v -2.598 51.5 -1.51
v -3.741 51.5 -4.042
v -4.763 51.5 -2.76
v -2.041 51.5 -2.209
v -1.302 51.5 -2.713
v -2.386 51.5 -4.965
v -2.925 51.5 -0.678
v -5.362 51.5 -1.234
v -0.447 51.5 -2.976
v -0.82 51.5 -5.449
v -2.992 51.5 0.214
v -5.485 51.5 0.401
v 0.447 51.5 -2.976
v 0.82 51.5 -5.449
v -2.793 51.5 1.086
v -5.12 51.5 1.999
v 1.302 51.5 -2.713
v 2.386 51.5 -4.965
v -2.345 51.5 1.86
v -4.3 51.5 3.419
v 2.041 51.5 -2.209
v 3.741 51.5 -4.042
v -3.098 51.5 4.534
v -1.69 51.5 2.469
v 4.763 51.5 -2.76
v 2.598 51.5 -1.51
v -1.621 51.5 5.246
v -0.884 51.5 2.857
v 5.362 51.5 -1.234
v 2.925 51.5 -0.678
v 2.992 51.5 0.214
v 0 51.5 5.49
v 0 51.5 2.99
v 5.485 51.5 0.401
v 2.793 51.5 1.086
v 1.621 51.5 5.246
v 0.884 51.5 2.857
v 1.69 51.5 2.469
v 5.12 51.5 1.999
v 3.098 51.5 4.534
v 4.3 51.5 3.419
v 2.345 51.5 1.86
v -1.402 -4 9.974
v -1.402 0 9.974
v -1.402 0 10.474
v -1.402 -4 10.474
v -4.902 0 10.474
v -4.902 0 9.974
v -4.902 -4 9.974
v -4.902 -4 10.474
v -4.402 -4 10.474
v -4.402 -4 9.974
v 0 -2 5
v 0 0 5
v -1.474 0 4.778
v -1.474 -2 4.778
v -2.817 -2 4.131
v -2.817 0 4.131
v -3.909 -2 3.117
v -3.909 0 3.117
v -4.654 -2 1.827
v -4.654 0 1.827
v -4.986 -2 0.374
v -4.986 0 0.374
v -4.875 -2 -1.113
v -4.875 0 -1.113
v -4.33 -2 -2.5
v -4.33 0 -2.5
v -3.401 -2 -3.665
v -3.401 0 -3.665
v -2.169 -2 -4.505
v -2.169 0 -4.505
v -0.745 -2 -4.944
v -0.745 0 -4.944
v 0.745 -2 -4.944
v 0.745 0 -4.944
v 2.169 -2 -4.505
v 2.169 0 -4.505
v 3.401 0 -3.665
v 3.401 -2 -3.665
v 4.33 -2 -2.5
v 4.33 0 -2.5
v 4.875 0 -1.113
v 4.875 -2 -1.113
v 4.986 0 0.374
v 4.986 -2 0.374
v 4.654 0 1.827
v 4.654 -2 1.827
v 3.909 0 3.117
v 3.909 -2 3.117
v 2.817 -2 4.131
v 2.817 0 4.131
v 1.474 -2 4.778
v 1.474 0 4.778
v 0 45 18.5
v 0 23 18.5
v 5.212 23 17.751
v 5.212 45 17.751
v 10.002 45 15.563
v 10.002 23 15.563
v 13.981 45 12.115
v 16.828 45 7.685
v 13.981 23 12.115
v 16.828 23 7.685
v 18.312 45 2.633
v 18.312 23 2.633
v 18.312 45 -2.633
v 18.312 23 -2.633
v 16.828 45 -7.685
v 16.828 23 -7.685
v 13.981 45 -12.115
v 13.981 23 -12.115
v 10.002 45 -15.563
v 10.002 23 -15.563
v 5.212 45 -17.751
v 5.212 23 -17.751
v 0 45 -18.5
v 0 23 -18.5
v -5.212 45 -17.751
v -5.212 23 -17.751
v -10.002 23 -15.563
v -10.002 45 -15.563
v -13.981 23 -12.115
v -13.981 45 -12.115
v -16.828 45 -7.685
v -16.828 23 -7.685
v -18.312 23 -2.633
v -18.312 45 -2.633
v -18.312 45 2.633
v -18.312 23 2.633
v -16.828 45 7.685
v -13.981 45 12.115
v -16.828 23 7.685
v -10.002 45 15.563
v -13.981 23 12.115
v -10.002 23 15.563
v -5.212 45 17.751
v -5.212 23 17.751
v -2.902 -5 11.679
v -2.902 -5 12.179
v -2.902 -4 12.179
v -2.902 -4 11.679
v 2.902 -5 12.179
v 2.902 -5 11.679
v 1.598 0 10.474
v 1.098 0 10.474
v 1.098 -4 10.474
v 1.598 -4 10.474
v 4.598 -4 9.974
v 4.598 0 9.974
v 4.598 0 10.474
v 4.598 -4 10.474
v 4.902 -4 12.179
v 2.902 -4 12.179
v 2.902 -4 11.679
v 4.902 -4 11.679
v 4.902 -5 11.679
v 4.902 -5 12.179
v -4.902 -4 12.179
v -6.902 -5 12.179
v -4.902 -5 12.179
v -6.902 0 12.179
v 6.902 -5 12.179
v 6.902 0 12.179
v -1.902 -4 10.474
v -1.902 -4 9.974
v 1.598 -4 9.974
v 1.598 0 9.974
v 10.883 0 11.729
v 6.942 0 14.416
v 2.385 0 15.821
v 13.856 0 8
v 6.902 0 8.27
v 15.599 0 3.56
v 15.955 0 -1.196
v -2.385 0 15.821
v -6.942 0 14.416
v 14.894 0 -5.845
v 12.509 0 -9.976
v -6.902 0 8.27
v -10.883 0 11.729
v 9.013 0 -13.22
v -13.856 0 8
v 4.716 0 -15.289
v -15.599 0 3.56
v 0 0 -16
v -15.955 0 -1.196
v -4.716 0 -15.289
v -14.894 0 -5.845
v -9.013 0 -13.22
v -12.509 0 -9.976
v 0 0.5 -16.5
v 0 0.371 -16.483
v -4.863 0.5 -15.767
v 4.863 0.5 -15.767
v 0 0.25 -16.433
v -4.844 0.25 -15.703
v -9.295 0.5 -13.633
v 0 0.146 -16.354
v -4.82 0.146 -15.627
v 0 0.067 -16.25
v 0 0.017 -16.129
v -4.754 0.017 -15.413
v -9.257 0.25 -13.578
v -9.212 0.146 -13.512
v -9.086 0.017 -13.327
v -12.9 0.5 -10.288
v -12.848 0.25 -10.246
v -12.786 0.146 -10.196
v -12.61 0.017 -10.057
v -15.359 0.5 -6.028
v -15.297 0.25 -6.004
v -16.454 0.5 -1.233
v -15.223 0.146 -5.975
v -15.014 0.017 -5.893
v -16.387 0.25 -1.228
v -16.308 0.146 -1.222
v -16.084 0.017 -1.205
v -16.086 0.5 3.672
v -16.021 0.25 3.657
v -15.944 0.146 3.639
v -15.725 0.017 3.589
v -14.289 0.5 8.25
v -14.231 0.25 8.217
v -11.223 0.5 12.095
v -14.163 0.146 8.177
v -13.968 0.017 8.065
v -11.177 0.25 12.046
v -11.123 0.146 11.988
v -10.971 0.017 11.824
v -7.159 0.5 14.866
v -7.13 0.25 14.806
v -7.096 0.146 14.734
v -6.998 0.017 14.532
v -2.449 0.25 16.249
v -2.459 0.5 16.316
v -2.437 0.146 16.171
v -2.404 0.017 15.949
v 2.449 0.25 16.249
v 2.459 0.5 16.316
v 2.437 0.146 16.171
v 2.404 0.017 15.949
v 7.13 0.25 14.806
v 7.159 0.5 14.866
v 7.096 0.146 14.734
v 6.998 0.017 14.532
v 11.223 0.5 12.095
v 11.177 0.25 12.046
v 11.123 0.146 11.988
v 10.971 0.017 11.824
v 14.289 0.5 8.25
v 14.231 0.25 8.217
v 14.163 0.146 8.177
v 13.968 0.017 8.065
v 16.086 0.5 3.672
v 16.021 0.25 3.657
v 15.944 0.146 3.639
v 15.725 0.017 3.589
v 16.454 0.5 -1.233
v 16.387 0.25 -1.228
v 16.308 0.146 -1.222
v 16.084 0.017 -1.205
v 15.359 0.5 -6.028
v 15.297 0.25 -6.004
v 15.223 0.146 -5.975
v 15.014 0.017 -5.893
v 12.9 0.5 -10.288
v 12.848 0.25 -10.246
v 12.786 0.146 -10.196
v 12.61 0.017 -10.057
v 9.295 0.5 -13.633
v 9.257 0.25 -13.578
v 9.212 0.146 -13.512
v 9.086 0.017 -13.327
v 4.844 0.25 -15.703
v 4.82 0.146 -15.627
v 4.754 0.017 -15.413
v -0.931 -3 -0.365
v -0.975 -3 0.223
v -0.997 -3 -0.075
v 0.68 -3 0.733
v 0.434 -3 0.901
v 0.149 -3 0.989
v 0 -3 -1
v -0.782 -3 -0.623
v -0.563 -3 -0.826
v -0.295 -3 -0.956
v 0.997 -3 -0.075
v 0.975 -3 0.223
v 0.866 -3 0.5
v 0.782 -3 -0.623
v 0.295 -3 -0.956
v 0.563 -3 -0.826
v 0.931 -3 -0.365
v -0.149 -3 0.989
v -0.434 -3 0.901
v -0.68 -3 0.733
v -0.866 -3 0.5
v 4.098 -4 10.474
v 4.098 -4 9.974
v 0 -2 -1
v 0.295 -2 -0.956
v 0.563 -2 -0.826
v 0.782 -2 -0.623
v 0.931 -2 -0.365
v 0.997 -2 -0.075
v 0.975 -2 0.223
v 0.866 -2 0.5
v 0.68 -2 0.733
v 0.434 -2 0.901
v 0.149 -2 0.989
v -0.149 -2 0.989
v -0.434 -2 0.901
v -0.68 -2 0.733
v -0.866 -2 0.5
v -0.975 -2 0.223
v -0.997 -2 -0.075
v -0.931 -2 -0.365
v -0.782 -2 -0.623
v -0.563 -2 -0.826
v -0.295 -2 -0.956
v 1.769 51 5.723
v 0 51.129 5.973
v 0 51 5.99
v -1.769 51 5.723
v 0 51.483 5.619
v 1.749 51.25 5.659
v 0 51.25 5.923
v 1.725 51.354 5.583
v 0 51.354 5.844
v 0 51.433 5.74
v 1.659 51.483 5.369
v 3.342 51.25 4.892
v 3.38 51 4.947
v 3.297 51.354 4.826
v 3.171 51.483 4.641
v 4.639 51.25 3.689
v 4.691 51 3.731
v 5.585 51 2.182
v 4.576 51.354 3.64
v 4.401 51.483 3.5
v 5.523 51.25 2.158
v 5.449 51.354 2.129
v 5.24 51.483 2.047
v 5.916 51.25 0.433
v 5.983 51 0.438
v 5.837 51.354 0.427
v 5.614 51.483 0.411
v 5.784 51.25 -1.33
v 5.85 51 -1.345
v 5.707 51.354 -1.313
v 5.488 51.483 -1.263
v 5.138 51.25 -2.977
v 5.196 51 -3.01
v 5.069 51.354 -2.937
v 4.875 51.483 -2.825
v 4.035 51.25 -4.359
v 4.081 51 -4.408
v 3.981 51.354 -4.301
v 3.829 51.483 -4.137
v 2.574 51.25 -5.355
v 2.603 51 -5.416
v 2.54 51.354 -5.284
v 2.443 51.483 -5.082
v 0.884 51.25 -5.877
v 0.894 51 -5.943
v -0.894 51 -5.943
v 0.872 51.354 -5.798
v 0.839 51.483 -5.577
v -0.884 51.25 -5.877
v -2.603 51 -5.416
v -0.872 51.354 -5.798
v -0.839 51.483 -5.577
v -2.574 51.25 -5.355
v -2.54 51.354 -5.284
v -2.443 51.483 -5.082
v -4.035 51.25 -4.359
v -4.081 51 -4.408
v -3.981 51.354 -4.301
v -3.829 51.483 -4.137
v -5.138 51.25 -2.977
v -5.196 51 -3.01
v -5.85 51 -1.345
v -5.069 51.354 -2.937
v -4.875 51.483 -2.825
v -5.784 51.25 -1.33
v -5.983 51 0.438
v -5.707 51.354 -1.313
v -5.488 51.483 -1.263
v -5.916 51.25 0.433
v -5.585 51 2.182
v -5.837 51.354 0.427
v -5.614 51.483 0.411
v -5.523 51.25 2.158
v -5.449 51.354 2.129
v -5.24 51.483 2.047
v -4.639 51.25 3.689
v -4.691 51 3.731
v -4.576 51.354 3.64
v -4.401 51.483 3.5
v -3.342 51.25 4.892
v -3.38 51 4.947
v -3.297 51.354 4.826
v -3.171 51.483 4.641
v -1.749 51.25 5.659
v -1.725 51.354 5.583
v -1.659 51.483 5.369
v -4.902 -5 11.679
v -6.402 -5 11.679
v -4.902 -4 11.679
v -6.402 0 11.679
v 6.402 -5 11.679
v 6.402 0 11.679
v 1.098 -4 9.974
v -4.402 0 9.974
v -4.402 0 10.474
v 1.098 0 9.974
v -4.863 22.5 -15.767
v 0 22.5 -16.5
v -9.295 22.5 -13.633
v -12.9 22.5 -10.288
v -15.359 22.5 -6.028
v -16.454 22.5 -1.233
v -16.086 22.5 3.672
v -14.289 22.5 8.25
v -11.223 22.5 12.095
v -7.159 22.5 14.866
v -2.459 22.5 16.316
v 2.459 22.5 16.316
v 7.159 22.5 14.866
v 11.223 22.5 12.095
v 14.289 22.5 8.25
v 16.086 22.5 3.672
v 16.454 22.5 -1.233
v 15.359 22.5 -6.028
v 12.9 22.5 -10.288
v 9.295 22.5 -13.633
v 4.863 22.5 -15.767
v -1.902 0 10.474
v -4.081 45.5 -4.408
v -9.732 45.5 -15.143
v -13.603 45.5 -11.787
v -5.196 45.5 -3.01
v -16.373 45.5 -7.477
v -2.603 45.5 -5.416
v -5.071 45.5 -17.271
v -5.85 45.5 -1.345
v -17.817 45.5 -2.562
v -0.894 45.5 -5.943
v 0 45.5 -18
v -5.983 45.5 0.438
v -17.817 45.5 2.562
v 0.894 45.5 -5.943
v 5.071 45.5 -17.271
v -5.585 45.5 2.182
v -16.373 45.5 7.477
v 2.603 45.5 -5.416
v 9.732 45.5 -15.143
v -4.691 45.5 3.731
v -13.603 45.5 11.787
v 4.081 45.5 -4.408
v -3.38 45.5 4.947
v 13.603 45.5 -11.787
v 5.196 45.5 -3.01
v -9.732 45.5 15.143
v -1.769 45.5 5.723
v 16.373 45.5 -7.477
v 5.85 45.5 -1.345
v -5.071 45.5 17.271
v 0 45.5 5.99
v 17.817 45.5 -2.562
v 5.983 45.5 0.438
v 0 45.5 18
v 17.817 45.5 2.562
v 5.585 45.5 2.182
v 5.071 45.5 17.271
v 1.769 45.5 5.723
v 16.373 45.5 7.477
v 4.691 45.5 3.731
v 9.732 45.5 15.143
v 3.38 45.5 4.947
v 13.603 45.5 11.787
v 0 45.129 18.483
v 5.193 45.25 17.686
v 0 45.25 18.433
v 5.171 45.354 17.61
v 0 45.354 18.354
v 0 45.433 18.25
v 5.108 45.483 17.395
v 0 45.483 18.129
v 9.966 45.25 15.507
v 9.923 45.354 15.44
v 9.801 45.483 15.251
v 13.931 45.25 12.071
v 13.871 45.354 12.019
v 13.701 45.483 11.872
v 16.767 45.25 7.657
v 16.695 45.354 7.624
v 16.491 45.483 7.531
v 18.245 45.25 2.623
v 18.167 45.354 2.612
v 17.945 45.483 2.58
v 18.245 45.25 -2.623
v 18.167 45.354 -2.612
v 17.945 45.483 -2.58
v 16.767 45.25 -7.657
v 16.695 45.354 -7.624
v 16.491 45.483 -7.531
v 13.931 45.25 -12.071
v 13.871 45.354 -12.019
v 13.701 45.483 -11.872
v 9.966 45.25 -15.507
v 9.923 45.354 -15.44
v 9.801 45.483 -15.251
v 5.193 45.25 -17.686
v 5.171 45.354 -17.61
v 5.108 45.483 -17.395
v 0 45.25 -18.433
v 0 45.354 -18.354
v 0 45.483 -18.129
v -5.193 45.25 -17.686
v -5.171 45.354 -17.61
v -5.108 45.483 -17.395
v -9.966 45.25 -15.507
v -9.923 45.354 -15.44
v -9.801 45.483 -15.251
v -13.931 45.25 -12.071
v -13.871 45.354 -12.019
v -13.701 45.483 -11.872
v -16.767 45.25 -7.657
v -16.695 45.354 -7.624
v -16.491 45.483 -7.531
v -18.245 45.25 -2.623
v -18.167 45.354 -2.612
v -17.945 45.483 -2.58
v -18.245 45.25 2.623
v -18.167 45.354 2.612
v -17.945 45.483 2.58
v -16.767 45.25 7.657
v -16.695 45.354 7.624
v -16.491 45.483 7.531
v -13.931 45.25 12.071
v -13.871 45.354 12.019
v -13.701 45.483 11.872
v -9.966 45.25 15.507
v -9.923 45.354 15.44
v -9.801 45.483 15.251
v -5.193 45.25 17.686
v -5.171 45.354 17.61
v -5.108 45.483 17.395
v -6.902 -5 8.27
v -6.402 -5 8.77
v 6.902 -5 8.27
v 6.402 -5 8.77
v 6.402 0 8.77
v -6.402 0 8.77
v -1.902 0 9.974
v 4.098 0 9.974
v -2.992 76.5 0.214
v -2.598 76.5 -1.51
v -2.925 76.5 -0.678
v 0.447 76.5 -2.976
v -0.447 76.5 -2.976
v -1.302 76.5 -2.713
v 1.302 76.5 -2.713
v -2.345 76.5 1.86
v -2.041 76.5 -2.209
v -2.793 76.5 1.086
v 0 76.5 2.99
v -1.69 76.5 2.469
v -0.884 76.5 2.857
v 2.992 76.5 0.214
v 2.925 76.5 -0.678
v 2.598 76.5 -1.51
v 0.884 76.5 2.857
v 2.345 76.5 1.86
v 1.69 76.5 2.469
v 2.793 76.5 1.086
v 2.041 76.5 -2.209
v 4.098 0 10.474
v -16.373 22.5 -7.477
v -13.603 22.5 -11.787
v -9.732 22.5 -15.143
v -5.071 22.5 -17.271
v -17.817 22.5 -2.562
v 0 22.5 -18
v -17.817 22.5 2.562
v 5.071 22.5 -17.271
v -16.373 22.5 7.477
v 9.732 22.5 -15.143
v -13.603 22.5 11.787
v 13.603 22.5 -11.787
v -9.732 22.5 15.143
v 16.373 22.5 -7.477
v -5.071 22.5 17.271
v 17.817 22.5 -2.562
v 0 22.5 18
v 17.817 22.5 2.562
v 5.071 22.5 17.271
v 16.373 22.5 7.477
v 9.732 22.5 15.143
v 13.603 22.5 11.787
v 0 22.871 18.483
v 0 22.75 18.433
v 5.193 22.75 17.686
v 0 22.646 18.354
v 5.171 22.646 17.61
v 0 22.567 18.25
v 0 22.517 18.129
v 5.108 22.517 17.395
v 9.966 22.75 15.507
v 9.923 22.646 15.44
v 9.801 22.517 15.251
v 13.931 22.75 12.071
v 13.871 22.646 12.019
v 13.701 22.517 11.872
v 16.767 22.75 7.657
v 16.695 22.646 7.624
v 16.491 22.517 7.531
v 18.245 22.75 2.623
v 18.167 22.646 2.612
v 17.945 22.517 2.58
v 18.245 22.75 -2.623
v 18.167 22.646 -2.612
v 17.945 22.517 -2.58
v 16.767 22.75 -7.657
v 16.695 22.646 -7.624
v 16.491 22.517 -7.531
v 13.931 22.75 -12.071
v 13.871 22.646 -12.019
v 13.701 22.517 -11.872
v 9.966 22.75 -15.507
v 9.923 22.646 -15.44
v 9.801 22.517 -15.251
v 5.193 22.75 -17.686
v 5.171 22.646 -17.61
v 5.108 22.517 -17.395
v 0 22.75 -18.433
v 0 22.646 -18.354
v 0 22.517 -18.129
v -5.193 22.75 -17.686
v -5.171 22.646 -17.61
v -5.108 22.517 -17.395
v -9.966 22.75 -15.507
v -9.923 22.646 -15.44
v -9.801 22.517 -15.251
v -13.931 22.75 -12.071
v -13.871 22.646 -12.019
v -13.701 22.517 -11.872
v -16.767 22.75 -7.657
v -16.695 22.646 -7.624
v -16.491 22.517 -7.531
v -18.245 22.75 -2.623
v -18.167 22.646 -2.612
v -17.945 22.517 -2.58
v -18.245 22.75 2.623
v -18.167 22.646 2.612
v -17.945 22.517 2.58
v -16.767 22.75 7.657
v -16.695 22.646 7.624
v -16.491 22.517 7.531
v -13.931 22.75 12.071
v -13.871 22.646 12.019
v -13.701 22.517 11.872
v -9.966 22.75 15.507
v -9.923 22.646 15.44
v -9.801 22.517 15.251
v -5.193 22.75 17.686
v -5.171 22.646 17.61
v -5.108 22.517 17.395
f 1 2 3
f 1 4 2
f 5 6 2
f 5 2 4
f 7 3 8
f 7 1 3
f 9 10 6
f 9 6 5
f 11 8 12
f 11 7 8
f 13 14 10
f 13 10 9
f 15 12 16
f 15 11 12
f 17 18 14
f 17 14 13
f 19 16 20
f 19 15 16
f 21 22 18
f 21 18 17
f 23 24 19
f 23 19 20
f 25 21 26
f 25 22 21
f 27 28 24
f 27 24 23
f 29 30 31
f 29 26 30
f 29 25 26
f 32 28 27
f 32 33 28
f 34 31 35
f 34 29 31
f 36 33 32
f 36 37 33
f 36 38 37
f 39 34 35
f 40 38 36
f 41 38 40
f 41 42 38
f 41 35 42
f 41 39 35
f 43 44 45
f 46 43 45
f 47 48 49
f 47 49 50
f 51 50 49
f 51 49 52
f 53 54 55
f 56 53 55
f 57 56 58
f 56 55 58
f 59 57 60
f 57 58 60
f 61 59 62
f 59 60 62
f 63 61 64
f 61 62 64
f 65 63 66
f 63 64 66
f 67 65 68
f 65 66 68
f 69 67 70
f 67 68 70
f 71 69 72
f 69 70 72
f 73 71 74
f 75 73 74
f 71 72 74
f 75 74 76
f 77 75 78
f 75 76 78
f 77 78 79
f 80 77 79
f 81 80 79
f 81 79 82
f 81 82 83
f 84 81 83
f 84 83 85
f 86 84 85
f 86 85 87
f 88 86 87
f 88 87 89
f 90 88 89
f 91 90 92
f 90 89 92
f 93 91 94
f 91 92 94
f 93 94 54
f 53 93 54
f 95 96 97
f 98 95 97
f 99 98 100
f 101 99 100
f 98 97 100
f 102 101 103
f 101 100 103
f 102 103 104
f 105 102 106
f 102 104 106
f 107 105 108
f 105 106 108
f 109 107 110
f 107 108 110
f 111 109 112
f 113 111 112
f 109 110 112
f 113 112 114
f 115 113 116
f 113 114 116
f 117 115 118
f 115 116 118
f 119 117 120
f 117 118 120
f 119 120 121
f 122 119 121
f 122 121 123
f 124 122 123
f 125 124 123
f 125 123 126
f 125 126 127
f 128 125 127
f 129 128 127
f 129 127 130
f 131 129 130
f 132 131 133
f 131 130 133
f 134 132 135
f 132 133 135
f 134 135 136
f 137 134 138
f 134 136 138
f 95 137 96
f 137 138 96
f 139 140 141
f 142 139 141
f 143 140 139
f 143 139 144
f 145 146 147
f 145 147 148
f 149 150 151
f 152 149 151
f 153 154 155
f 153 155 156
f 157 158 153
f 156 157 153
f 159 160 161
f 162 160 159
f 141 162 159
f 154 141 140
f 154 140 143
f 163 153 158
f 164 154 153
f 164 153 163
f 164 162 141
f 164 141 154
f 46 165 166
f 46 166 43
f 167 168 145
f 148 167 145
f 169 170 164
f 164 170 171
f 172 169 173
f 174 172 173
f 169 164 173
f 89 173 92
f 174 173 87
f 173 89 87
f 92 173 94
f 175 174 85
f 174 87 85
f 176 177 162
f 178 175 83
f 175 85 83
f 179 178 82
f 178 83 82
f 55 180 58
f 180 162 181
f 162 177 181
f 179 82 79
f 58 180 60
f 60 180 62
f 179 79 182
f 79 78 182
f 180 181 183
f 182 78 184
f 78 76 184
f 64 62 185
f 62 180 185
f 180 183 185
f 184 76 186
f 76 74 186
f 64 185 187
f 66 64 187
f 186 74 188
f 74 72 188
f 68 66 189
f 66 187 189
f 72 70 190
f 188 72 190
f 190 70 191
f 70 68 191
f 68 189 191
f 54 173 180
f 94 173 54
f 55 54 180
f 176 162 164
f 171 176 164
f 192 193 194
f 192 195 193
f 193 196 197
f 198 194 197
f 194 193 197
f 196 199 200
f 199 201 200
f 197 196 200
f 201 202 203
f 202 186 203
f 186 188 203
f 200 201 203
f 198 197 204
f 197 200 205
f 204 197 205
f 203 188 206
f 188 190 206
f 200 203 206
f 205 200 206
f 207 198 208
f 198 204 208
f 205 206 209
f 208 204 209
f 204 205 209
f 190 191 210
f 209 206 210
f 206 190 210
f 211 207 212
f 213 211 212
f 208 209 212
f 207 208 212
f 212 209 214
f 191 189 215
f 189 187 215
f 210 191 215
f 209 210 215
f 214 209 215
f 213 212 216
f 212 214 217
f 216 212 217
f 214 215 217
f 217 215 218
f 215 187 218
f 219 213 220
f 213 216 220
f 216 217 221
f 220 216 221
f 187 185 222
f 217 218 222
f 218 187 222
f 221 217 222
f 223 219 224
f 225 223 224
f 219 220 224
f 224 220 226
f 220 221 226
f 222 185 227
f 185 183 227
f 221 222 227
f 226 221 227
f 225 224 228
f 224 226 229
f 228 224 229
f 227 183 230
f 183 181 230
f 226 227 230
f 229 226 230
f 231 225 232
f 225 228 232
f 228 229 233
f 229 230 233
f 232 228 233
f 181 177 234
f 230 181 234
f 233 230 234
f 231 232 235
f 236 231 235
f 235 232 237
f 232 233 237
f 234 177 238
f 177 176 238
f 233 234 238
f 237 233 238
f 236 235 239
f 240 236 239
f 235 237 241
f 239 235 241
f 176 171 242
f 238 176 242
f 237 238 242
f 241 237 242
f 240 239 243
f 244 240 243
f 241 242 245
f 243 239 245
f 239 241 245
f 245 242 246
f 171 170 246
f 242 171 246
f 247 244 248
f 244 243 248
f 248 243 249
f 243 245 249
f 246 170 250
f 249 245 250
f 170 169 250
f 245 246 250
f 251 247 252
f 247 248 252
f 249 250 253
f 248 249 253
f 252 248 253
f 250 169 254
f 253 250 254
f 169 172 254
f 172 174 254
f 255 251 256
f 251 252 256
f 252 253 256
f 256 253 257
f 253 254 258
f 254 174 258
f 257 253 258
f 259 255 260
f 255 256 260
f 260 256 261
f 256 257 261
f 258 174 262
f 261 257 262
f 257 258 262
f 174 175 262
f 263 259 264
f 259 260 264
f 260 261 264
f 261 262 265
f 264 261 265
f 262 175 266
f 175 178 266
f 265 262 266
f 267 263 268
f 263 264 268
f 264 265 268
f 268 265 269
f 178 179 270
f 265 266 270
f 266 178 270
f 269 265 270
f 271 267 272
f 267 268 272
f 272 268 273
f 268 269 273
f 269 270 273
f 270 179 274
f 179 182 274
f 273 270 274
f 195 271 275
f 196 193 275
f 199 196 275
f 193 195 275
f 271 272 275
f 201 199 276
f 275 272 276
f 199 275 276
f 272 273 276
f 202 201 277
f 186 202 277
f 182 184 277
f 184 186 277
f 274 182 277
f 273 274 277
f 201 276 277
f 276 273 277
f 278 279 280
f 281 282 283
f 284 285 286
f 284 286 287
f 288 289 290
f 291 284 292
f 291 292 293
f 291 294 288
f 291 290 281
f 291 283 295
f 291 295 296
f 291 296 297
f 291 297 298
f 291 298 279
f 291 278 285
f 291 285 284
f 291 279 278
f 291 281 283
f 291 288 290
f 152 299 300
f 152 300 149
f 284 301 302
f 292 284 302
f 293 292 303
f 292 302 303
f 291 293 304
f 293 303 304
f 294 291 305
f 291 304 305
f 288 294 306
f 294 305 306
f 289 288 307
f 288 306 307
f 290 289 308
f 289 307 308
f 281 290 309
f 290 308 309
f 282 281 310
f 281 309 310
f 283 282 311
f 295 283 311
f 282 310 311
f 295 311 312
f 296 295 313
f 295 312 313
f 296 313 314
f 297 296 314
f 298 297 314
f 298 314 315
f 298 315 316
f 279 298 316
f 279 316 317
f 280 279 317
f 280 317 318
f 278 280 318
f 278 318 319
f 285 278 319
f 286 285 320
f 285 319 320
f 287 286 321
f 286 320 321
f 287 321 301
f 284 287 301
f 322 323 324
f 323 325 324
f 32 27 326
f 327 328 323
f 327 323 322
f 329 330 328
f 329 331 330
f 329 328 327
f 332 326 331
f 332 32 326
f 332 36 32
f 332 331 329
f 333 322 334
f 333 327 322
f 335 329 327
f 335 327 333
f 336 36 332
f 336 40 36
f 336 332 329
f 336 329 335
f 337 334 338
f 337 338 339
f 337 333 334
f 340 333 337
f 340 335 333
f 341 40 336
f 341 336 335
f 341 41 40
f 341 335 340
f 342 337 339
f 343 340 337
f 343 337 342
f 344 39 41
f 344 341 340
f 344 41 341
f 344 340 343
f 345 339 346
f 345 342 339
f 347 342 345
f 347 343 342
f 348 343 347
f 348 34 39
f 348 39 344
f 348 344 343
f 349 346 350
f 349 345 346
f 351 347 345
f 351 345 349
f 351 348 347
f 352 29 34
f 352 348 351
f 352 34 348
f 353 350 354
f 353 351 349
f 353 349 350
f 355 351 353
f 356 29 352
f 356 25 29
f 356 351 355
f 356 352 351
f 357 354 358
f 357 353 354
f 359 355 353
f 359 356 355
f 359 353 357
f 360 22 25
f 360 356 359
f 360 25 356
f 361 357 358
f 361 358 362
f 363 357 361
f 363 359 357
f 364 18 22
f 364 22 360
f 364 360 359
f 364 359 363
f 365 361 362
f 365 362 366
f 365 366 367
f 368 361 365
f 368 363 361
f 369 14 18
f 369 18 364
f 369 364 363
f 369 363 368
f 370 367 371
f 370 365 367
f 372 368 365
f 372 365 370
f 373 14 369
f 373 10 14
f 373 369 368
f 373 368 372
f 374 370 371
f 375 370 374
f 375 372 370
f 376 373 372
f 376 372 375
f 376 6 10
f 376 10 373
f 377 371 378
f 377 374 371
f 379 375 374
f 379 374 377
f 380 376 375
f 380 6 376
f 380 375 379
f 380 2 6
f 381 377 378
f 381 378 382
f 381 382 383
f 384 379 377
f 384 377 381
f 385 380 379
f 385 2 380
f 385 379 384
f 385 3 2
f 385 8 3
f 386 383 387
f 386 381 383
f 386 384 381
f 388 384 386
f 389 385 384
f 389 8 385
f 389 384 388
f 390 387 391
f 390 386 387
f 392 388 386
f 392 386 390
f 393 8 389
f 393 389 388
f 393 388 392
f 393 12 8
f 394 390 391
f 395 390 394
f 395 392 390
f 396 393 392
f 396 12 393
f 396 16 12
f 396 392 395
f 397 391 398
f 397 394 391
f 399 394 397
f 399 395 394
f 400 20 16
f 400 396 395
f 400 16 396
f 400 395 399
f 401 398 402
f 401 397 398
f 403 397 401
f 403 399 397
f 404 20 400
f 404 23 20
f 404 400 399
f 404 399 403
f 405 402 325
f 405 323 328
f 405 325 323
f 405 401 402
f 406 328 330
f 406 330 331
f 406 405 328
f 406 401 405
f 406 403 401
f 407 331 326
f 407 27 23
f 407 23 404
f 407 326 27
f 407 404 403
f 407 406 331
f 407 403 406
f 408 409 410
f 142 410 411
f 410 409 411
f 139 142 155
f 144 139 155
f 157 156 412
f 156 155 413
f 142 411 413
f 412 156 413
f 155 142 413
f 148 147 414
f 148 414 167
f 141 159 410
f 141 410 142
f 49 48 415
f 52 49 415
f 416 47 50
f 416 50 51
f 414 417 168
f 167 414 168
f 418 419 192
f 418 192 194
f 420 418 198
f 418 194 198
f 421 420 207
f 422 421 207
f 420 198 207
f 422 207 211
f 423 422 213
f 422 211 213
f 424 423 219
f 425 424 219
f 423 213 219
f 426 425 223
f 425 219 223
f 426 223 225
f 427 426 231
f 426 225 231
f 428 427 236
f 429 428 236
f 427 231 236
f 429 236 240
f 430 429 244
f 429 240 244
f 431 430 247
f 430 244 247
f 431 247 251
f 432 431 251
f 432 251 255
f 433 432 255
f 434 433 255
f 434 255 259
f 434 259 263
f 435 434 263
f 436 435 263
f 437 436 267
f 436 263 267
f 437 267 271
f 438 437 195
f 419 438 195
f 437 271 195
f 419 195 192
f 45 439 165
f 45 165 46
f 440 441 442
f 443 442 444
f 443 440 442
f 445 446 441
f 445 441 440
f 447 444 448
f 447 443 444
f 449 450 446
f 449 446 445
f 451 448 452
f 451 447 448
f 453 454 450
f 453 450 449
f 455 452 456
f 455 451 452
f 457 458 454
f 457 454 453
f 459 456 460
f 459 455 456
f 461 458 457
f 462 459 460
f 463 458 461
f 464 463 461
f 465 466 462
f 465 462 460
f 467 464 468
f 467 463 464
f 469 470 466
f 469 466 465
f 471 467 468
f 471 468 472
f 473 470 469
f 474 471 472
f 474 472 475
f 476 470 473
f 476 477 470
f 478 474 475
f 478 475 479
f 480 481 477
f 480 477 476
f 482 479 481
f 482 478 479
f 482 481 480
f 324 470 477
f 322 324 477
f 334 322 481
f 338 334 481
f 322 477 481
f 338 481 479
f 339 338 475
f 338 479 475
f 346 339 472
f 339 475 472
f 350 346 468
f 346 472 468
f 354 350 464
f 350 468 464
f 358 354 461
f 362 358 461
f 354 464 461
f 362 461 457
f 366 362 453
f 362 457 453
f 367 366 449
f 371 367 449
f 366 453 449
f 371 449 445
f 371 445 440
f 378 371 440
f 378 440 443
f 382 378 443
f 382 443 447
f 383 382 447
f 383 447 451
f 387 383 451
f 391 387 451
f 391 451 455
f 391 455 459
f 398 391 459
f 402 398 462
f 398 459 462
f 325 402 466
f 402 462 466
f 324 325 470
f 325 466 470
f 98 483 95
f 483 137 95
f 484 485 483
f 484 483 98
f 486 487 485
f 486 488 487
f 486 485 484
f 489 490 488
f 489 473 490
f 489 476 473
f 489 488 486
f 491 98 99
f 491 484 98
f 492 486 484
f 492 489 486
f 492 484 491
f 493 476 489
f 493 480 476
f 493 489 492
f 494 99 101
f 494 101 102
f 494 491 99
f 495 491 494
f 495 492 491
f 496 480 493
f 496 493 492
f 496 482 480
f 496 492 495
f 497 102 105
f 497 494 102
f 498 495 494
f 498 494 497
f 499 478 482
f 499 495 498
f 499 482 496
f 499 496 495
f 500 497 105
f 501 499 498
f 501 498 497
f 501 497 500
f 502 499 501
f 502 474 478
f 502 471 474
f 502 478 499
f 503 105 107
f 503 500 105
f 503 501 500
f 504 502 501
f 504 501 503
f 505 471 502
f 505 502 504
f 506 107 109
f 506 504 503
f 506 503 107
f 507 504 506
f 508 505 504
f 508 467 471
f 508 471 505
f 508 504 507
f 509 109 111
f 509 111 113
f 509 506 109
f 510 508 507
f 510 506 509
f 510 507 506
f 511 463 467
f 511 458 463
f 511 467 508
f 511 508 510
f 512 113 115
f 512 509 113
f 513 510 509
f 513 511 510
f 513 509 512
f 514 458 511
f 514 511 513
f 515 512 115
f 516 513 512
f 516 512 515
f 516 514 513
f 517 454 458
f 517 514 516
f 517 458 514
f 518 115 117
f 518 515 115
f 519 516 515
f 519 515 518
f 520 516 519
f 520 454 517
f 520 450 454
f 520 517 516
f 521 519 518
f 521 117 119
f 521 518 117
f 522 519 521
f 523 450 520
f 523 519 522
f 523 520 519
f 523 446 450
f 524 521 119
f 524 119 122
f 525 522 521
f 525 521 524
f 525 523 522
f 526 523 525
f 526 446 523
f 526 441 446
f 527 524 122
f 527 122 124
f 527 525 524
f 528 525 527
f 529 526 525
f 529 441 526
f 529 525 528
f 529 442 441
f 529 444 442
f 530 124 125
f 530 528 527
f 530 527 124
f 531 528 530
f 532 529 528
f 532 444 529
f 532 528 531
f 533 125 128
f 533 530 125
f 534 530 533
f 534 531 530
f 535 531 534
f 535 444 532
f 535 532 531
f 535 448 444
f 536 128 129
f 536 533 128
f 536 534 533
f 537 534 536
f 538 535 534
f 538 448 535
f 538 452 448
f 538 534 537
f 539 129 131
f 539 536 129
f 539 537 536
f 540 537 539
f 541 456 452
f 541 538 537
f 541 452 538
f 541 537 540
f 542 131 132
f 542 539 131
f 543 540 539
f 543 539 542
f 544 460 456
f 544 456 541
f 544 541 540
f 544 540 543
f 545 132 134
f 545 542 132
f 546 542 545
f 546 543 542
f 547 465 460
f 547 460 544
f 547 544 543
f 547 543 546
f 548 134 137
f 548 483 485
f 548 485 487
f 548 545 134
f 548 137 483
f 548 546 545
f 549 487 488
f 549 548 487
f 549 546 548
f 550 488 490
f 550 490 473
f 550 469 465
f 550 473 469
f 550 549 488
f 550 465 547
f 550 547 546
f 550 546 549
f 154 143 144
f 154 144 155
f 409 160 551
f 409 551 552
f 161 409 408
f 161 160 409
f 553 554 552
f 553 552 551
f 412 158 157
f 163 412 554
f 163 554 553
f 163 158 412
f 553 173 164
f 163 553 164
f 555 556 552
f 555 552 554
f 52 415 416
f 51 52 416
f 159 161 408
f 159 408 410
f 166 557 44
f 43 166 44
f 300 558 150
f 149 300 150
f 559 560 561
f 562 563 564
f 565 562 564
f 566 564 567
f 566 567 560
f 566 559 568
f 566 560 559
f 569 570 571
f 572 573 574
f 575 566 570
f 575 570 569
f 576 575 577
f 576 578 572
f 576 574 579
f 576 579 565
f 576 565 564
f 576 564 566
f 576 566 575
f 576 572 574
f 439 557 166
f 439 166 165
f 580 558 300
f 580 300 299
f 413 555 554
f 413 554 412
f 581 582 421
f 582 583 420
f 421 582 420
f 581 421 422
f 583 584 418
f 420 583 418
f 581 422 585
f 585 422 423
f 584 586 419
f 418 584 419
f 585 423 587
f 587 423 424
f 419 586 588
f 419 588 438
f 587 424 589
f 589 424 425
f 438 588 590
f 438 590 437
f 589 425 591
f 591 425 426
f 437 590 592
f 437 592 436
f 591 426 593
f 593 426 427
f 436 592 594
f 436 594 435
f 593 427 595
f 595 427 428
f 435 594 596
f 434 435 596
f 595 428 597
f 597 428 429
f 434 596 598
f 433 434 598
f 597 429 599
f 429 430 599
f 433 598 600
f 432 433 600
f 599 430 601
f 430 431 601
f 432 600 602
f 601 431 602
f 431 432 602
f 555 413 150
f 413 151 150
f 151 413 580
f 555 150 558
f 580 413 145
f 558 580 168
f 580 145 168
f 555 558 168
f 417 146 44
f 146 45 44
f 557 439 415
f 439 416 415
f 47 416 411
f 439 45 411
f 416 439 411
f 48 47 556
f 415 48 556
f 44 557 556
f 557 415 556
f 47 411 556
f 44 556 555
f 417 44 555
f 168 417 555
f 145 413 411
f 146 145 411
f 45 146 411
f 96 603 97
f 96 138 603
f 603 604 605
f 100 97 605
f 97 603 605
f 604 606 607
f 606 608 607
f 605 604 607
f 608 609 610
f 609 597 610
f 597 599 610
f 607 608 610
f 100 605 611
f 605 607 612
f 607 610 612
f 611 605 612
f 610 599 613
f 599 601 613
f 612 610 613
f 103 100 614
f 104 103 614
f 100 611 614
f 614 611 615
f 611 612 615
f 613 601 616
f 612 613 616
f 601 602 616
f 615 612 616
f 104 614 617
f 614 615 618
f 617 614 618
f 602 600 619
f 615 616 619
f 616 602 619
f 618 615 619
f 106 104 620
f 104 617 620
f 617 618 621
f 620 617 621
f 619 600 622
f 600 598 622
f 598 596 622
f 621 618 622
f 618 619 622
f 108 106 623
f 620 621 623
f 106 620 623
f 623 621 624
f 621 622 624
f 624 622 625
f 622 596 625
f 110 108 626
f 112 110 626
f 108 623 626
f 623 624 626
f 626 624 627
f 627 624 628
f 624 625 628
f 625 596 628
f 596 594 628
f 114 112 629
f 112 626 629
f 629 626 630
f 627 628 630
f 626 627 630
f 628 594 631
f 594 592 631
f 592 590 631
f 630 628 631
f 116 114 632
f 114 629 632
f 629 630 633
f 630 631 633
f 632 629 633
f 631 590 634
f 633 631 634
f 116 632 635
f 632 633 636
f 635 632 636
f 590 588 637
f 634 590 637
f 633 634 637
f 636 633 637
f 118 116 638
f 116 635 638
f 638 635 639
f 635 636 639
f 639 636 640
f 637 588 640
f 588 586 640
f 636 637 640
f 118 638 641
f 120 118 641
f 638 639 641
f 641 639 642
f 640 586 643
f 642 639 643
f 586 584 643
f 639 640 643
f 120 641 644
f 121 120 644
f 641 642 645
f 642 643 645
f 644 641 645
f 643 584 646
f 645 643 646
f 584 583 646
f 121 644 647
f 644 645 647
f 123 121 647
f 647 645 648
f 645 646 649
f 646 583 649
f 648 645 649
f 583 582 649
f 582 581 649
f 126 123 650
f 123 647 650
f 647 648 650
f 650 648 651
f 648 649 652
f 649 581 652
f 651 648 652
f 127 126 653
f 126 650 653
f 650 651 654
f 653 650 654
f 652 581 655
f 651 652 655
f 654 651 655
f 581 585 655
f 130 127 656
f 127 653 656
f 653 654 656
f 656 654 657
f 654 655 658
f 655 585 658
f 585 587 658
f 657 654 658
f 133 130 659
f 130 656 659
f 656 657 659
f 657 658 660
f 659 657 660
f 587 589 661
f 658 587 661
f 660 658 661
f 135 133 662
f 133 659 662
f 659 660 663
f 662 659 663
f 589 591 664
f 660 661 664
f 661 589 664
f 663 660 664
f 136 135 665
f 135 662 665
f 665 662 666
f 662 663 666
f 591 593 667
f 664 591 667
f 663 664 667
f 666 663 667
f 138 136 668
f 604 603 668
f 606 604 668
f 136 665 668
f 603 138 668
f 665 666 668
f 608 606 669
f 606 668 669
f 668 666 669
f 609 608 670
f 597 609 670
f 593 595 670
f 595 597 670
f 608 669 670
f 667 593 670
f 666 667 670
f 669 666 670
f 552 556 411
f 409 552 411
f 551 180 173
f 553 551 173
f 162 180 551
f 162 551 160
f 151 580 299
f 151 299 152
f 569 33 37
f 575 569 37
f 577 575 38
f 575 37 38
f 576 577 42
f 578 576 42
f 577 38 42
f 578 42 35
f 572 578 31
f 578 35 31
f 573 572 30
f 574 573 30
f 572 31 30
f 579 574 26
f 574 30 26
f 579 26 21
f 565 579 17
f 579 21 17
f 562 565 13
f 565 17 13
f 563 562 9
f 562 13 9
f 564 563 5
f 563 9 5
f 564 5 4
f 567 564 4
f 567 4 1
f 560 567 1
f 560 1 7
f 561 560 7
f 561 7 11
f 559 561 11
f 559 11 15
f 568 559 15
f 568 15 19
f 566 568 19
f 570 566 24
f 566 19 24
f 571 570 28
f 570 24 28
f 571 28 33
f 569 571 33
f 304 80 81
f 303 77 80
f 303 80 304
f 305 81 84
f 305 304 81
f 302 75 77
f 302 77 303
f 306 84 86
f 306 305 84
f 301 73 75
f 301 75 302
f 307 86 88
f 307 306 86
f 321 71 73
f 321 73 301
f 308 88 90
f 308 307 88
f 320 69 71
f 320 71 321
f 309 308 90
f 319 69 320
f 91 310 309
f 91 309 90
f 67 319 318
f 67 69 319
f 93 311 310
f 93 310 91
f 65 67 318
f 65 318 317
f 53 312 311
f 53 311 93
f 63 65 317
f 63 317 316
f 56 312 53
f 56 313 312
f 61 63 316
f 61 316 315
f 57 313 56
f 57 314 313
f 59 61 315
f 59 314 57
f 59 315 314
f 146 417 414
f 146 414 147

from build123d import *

# Parameters (mm, degrees)
SKETCH1_R           = 16.5
BOSS_EXTRUDE1_DEPTH = 22.5
SKETCH2_R           = 18.5
BOSS_EXTRUDE2_DEPTH = 23
SKETCH3_R           = 6
BOSS_EXTRUDE3_DEPTH = 6
SKETCH4_R           = 3
BOSS_EXTRUDE4_DEPTH = 25
FILLET4_R           = 0.5
FILLET5_R           = 0.5
FILLET6_R           = 0.5
FILLET7_R           = 0.5
SKETCH9_R           = 5
BOSS_EXTRUDE5_DEPTH = 2
SKETCH10_R          = 1
BOSS_EXTRUDE6_DEPTH = 1
SKETCH11_W          = 13.803464896
SKETCH11_H          = 3.909651907
SKETCH11_W_2        = 12.803464896
SKETCH11_H_2        = 2.909651907
BOSS_EXTRUDE7_DEPTH = 5
SKETCH12_W          = 2
SKETCH12_H          = 1
CUT_EXTRUDE5_DEPTH  = 2
SKETCH13_W          = 0.5
SKETCH13_H          = 0.5
BOSS_EXTRUDE8_DEPTH = 4


with BuildPart() as part:
    # Sketch1 → Boss-Extrude1 (new body)
    with BuildSketch(Plane(origin=(0, 0, 0), x_dir=(1, 0, 0), z_dir=(0, 1, 0))):
        with Locations(Location((0, 0, 0), (0, 0, 90))):
            Circle(SKETCH1_R)
    extrude(amount=BOSS_EXTRUDE1_DEPTH)

    # Sketch2 → Boss-Extrude2 (add)
    with BuildSketch(Plane(origin=(0, 22.5, 0), x_dir=(1, 0, 0), z_dir=(0, 1, 0))):
        with Locations(Location((0, 0, 0), (0, 0, 270))):
            Circle(SKETCH2_R)
    extrude(amount=BOSS_EXTRUDE2_DEPTH)

    # Sketch3 → Boss-Extrude3 (add)
    with BuildSketch(Plane(origin=(0, 45.5, 0), x_dir=(1, 0, 0), z_dir=(0, 1, 0))):
        with Locations(Location((0, 0.01, 0), (0, 0, 270))):
            Circle(SKETCH3_R)
    extrude(amount=BOSS_EXTRUDE3_DEPTH)

    # Sketch4 → Boss-Extrude4 (add)
    with BuildSketch(Plane(origin=(0, 51.5, 0), x_dir=(1, 0, 0), z_dir=(0, 1, 0))):
        with Locations(Location((0, 0.01, 0), (0, 0, 270))):
            Circle(SKETCH4_R)
    extrude(amount=BOSS_EXTRUDE4_DEPTH)

    # Fillet4
    fillet4_edges = [part.edges().sort_by_distance(p)[0] for p in [
        (0, 22.5, -18.5),
    ]]
    fillet(fillet4_edges, radius=FILLET4_R)

    # Fillet5
    fillet5_edges = [part.edges().sort_by_distance(p)[0] for p in [
        (0, 0, 16.5),
    ]]
    fillet(fillet5_edges, radius=FILLET5_R)

    # Fillet6
    fillet6_edges = [part.edges().sort_by_distance(p)[0] for p in [
        (0, 45.5, -18.5),
    ]]
    fillet(fillet6_edges, radius=FILLET6_R)

    # Fillet7
    fillet7_edges = [part.edges().sort_by_distance(p)[0] for p in [
        (0, 51.5, -6.01),
    ]]
    fillet(fillet7_edges, radius=FILLET7_R)

    # Sketch9 → Boss-Extrude5 (add)
    with BuildSketch(Plane.XZ):
        with Locations(Location((0, 0, 0), (0, 0, 90))):
            Circle(SKETCH9_R)
    extrude(amount=BOSS_EXTRUDE5_DEPTH)

    # Sketch10 → Boss-Extrude6 (add)
    with BuildSketch(Plane.XZ.offset(2)):
        with Locations(Location((0, 0, 0), (0, 0, 270))):
            Circle(SKETCH10_R)
    extrude(amount=BOSS_EXTRUDE6_DEPTH)

    # Sketch11 → Boss-Extrude7 (add)
    with BuildSketch(Plane.XZ):
        with Locations((0, 10.224361626)):
            Rectangle(SKETCH11_W, SKETCH11_H)
        with Locations((0, 10.224361626)):
            Rectangle(SKETCH11_W_2, SKETCH11_H_2, mode=Mode.SUBTRACT)
    extrude(amount=BOSS_EXTRUDE7_DEPTH)

    # Sketch12 → Cut-Extrude5 (cut)
    with BuildSketch(Plane.XY.offset(12.179187579)):
        with Locations((-3.901732448, -4.5)):
            Rectangle(SKETCH12_W, SKETCH12_H)
        with Locations((3.901732448, -4.5)):
            Rectangle(SKETCH12_W, SKETCH12_H)
    extrude(amount=-CUT_EXTRUDE5_DEPTH, mode=Mode.SUBTRACT)

    # Sketch13 → Boss-Extrude8 (add)
    with BuildSketch(Plane.XZ):
        with Locations((-4.651732448, 10.224361626)):
            Rectangle(SKETCH13_W, SKETCH13_H)
        with Locations((-1.651732448, 10.224361626)):
            Rectangle(SKETCH13_W, SKETCH13_H)
        with Locations((1.348267552, 10.224361626)):
            Rectangle(SKETCH13_W, SKETCH13_H)
        with Locations((4.348267552, 10.224361626)):
            Rectangle(SKETCH13_W, SKETCH13_H)
    extrude(amount=BOSS_EXTRUDE8_DEPTH)


solid = part.part
